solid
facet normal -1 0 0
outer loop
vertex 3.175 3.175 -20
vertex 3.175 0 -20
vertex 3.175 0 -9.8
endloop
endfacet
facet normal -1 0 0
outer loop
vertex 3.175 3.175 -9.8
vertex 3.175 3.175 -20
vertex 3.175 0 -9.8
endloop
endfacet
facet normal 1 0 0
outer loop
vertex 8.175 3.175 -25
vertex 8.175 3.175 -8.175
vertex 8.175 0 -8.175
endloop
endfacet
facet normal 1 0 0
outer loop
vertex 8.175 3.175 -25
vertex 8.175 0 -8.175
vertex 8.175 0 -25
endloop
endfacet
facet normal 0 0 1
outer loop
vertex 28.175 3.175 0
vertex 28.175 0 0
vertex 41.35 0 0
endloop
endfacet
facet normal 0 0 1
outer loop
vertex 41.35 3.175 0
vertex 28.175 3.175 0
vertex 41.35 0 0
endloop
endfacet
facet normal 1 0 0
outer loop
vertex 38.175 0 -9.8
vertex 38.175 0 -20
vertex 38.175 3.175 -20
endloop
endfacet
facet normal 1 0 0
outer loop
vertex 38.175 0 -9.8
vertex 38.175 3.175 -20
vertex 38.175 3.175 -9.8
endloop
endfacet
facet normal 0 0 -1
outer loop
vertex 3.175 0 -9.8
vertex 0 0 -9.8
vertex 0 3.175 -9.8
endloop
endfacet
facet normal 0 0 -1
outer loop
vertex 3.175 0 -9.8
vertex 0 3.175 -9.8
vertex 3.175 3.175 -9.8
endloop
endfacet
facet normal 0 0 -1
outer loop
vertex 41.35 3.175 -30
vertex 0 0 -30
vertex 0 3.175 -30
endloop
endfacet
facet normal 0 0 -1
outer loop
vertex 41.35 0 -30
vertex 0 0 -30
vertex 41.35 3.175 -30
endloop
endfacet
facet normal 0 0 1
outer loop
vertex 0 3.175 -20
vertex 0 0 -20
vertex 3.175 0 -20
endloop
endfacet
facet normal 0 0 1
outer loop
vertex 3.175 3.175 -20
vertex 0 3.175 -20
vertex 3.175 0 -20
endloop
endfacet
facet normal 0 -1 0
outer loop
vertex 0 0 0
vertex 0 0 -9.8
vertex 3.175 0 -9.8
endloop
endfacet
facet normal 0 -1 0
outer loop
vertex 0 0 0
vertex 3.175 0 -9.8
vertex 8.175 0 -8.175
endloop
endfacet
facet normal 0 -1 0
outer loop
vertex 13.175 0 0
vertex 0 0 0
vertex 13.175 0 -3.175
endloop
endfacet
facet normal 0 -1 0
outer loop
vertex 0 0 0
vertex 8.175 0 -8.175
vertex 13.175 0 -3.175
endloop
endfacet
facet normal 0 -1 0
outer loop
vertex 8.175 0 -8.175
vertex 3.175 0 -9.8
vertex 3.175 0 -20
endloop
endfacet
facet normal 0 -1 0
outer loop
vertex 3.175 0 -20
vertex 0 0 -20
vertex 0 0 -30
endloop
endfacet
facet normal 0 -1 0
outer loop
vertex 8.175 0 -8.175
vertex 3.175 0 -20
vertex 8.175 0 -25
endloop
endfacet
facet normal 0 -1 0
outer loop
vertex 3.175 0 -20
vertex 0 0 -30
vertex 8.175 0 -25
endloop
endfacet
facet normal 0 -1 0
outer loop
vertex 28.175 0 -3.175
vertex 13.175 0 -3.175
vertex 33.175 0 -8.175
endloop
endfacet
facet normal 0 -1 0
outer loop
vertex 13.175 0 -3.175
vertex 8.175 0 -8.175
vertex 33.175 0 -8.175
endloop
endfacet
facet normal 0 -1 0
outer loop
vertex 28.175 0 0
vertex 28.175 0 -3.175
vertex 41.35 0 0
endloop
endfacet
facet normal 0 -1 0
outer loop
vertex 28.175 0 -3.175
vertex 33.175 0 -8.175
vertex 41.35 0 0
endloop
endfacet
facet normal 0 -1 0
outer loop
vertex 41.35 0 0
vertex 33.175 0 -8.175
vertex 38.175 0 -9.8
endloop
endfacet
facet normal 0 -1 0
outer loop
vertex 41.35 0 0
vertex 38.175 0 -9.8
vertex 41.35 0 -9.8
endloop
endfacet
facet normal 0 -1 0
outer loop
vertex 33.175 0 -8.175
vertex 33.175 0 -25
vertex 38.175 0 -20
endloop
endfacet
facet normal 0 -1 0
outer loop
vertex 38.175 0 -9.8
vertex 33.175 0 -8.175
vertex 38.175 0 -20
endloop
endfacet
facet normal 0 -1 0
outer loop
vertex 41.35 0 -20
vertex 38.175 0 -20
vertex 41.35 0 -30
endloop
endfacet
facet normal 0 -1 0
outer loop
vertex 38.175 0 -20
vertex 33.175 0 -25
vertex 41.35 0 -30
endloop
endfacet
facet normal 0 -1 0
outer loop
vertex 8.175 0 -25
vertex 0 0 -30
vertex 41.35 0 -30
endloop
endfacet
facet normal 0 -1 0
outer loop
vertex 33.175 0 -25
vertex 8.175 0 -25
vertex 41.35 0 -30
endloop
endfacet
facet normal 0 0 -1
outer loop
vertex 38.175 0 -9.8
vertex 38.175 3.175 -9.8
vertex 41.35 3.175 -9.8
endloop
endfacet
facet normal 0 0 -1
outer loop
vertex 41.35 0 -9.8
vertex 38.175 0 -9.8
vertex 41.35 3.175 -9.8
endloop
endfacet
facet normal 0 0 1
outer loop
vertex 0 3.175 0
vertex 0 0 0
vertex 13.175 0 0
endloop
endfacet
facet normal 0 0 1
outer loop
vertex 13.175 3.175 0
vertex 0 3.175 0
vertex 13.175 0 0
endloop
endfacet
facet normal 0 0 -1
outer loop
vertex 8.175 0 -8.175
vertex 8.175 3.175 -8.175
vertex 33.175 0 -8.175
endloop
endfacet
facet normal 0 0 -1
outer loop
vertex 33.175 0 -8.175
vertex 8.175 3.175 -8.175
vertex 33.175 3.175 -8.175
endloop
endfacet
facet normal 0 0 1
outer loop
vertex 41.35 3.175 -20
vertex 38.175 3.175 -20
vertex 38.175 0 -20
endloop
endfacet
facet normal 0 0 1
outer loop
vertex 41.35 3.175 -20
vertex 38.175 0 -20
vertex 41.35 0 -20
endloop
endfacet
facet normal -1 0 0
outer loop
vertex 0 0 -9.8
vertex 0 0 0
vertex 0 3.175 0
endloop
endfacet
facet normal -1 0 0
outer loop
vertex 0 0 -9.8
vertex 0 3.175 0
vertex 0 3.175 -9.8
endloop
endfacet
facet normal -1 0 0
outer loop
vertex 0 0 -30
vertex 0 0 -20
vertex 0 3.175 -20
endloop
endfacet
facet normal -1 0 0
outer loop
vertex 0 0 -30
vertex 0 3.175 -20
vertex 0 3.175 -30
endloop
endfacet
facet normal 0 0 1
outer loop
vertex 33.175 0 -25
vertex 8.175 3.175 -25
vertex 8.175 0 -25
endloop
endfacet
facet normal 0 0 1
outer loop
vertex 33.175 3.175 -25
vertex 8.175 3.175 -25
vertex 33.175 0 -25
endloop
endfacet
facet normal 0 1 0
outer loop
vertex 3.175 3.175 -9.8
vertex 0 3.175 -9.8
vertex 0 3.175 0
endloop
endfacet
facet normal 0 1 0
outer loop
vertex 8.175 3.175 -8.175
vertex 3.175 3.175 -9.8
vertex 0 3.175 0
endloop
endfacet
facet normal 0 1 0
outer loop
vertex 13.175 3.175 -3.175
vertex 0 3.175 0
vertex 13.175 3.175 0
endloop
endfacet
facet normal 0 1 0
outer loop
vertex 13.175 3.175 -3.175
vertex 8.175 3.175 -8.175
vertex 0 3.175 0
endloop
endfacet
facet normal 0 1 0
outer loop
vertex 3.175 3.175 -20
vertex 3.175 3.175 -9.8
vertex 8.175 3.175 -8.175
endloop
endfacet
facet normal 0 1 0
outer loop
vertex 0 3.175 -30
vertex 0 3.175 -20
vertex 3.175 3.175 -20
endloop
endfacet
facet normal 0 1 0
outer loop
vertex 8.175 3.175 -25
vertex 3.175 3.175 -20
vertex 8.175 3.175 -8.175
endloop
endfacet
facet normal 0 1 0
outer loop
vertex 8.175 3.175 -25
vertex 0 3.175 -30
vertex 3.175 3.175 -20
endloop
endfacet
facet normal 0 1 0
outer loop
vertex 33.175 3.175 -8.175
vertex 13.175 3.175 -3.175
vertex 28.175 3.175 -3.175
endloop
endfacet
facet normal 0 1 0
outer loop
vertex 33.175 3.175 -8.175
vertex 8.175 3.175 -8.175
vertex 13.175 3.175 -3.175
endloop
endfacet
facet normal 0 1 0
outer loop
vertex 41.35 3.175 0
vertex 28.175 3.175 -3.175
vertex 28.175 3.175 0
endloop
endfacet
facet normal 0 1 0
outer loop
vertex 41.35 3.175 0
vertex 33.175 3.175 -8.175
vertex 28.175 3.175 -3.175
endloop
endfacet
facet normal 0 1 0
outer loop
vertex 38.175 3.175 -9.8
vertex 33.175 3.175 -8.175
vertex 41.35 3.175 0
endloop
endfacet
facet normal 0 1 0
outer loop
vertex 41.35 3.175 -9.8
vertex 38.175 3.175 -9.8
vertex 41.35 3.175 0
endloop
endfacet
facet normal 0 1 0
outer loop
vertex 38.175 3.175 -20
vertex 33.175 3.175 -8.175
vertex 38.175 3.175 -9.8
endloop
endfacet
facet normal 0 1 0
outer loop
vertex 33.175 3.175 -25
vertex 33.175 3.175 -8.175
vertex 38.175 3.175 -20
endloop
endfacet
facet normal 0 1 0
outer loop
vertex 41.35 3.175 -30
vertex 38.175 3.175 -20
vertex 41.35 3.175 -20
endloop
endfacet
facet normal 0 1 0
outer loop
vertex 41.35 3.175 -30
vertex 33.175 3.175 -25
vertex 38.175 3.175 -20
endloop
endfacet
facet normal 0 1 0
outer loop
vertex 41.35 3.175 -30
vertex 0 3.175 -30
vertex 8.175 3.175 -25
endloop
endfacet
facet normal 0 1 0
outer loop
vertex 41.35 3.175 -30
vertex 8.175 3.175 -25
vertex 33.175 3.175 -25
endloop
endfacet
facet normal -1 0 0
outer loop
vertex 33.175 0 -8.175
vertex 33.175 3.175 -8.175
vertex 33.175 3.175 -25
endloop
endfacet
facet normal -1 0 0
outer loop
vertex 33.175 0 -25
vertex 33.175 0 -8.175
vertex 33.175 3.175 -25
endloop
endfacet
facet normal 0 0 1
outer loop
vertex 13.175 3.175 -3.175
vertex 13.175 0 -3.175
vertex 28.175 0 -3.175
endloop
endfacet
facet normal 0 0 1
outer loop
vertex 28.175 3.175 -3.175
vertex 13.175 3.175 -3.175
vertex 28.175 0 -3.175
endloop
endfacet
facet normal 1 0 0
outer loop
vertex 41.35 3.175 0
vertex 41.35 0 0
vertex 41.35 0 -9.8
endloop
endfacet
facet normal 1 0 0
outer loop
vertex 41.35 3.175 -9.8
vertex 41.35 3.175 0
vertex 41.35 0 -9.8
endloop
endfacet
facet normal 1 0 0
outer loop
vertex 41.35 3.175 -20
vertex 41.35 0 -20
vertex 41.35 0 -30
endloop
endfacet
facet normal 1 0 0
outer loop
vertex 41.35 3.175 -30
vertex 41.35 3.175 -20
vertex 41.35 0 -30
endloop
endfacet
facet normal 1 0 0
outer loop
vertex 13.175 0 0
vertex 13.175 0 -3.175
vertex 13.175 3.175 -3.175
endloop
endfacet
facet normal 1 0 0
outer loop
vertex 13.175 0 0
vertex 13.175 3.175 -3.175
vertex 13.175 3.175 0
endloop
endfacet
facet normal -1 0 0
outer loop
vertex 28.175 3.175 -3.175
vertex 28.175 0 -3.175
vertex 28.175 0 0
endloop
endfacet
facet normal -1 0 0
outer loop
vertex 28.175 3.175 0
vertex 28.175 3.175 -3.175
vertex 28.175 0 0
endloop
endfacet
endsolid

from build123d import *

# Parameters (mm, degrees)
SKETCH1_W               = 41.35
SKETCH1_H               = 30
BOSS_EXTRUDE1_DEPTH     = 3.175
SKETCH2_W               = 3.175
SKETCH2_H               = 10.2
SKETCH2_W_2             = 15
SKETCH2_H_2             = 3.175
CUT_EXTRUDE1_DEPTH      = 4.175
SKETCH3_W               = 25
SKETCH3_H               = 16.825
CUT_EXTRUDE2_DEPTH      = 1
CUT_EXTRUDE2_DEPTH_BACK = 4.175


with BuildPart() as part:
    # Sketch1 → Boss-Extrude1 (new body)
    with BuildSketch(Plane(origin=(0, 0, 0), x_dir=(1, 0, 0), z_dir=(0, 1, 0))):
        with Locations((20.675, 15)):
            Rectangle(SKETCH1_W, SKETCH1_H)
    extrude(amount=BOSS_EXTRUDE1_DEPTH)

    # Sketch2 → Cut-Extrude1 (cut, through all)
    with BuildSketch(Plane.XZ):
        with Locations((1.5875, -14.9)):
            Rectangle(SKETCH2_W, SKETCH2_H)
        with Locations((39.7625, -14.9)):
            Rectangle(SKETCH2_W, SKETCH2_H)
        with Locations((20.675, -1.5875)):
            Rectangle(SKETCH2_W_2, SKETCH2_H_2)
    extrude(amount=-CUT_EXTRUDE1_DEPTH, mode=Mode.SUBTRACT)

    # Sketch3 → Cut-Extrude2 (cut, two sides)
    with BuildSketch(Plane(origin=(0, 3.175, 0), x_dir=(1, 0, 0), z_dir=(0, 1, 0))) as cut_extrude2_sk:
        with Locations((20.675, 16.5875)):
            Rectangle(SKETCH3_W, SKETCH3_H)
    extrude(amount=CUT_EXTRUDE2_DEPTH, mode=Mode.SUBTRACT)
    extrude(cut_extrude2_sk.sketch, amount=-CUT_EXTRUDE2_DEPTH_BACK, mode=Mode.SUBTRACT)


solid = part.part
